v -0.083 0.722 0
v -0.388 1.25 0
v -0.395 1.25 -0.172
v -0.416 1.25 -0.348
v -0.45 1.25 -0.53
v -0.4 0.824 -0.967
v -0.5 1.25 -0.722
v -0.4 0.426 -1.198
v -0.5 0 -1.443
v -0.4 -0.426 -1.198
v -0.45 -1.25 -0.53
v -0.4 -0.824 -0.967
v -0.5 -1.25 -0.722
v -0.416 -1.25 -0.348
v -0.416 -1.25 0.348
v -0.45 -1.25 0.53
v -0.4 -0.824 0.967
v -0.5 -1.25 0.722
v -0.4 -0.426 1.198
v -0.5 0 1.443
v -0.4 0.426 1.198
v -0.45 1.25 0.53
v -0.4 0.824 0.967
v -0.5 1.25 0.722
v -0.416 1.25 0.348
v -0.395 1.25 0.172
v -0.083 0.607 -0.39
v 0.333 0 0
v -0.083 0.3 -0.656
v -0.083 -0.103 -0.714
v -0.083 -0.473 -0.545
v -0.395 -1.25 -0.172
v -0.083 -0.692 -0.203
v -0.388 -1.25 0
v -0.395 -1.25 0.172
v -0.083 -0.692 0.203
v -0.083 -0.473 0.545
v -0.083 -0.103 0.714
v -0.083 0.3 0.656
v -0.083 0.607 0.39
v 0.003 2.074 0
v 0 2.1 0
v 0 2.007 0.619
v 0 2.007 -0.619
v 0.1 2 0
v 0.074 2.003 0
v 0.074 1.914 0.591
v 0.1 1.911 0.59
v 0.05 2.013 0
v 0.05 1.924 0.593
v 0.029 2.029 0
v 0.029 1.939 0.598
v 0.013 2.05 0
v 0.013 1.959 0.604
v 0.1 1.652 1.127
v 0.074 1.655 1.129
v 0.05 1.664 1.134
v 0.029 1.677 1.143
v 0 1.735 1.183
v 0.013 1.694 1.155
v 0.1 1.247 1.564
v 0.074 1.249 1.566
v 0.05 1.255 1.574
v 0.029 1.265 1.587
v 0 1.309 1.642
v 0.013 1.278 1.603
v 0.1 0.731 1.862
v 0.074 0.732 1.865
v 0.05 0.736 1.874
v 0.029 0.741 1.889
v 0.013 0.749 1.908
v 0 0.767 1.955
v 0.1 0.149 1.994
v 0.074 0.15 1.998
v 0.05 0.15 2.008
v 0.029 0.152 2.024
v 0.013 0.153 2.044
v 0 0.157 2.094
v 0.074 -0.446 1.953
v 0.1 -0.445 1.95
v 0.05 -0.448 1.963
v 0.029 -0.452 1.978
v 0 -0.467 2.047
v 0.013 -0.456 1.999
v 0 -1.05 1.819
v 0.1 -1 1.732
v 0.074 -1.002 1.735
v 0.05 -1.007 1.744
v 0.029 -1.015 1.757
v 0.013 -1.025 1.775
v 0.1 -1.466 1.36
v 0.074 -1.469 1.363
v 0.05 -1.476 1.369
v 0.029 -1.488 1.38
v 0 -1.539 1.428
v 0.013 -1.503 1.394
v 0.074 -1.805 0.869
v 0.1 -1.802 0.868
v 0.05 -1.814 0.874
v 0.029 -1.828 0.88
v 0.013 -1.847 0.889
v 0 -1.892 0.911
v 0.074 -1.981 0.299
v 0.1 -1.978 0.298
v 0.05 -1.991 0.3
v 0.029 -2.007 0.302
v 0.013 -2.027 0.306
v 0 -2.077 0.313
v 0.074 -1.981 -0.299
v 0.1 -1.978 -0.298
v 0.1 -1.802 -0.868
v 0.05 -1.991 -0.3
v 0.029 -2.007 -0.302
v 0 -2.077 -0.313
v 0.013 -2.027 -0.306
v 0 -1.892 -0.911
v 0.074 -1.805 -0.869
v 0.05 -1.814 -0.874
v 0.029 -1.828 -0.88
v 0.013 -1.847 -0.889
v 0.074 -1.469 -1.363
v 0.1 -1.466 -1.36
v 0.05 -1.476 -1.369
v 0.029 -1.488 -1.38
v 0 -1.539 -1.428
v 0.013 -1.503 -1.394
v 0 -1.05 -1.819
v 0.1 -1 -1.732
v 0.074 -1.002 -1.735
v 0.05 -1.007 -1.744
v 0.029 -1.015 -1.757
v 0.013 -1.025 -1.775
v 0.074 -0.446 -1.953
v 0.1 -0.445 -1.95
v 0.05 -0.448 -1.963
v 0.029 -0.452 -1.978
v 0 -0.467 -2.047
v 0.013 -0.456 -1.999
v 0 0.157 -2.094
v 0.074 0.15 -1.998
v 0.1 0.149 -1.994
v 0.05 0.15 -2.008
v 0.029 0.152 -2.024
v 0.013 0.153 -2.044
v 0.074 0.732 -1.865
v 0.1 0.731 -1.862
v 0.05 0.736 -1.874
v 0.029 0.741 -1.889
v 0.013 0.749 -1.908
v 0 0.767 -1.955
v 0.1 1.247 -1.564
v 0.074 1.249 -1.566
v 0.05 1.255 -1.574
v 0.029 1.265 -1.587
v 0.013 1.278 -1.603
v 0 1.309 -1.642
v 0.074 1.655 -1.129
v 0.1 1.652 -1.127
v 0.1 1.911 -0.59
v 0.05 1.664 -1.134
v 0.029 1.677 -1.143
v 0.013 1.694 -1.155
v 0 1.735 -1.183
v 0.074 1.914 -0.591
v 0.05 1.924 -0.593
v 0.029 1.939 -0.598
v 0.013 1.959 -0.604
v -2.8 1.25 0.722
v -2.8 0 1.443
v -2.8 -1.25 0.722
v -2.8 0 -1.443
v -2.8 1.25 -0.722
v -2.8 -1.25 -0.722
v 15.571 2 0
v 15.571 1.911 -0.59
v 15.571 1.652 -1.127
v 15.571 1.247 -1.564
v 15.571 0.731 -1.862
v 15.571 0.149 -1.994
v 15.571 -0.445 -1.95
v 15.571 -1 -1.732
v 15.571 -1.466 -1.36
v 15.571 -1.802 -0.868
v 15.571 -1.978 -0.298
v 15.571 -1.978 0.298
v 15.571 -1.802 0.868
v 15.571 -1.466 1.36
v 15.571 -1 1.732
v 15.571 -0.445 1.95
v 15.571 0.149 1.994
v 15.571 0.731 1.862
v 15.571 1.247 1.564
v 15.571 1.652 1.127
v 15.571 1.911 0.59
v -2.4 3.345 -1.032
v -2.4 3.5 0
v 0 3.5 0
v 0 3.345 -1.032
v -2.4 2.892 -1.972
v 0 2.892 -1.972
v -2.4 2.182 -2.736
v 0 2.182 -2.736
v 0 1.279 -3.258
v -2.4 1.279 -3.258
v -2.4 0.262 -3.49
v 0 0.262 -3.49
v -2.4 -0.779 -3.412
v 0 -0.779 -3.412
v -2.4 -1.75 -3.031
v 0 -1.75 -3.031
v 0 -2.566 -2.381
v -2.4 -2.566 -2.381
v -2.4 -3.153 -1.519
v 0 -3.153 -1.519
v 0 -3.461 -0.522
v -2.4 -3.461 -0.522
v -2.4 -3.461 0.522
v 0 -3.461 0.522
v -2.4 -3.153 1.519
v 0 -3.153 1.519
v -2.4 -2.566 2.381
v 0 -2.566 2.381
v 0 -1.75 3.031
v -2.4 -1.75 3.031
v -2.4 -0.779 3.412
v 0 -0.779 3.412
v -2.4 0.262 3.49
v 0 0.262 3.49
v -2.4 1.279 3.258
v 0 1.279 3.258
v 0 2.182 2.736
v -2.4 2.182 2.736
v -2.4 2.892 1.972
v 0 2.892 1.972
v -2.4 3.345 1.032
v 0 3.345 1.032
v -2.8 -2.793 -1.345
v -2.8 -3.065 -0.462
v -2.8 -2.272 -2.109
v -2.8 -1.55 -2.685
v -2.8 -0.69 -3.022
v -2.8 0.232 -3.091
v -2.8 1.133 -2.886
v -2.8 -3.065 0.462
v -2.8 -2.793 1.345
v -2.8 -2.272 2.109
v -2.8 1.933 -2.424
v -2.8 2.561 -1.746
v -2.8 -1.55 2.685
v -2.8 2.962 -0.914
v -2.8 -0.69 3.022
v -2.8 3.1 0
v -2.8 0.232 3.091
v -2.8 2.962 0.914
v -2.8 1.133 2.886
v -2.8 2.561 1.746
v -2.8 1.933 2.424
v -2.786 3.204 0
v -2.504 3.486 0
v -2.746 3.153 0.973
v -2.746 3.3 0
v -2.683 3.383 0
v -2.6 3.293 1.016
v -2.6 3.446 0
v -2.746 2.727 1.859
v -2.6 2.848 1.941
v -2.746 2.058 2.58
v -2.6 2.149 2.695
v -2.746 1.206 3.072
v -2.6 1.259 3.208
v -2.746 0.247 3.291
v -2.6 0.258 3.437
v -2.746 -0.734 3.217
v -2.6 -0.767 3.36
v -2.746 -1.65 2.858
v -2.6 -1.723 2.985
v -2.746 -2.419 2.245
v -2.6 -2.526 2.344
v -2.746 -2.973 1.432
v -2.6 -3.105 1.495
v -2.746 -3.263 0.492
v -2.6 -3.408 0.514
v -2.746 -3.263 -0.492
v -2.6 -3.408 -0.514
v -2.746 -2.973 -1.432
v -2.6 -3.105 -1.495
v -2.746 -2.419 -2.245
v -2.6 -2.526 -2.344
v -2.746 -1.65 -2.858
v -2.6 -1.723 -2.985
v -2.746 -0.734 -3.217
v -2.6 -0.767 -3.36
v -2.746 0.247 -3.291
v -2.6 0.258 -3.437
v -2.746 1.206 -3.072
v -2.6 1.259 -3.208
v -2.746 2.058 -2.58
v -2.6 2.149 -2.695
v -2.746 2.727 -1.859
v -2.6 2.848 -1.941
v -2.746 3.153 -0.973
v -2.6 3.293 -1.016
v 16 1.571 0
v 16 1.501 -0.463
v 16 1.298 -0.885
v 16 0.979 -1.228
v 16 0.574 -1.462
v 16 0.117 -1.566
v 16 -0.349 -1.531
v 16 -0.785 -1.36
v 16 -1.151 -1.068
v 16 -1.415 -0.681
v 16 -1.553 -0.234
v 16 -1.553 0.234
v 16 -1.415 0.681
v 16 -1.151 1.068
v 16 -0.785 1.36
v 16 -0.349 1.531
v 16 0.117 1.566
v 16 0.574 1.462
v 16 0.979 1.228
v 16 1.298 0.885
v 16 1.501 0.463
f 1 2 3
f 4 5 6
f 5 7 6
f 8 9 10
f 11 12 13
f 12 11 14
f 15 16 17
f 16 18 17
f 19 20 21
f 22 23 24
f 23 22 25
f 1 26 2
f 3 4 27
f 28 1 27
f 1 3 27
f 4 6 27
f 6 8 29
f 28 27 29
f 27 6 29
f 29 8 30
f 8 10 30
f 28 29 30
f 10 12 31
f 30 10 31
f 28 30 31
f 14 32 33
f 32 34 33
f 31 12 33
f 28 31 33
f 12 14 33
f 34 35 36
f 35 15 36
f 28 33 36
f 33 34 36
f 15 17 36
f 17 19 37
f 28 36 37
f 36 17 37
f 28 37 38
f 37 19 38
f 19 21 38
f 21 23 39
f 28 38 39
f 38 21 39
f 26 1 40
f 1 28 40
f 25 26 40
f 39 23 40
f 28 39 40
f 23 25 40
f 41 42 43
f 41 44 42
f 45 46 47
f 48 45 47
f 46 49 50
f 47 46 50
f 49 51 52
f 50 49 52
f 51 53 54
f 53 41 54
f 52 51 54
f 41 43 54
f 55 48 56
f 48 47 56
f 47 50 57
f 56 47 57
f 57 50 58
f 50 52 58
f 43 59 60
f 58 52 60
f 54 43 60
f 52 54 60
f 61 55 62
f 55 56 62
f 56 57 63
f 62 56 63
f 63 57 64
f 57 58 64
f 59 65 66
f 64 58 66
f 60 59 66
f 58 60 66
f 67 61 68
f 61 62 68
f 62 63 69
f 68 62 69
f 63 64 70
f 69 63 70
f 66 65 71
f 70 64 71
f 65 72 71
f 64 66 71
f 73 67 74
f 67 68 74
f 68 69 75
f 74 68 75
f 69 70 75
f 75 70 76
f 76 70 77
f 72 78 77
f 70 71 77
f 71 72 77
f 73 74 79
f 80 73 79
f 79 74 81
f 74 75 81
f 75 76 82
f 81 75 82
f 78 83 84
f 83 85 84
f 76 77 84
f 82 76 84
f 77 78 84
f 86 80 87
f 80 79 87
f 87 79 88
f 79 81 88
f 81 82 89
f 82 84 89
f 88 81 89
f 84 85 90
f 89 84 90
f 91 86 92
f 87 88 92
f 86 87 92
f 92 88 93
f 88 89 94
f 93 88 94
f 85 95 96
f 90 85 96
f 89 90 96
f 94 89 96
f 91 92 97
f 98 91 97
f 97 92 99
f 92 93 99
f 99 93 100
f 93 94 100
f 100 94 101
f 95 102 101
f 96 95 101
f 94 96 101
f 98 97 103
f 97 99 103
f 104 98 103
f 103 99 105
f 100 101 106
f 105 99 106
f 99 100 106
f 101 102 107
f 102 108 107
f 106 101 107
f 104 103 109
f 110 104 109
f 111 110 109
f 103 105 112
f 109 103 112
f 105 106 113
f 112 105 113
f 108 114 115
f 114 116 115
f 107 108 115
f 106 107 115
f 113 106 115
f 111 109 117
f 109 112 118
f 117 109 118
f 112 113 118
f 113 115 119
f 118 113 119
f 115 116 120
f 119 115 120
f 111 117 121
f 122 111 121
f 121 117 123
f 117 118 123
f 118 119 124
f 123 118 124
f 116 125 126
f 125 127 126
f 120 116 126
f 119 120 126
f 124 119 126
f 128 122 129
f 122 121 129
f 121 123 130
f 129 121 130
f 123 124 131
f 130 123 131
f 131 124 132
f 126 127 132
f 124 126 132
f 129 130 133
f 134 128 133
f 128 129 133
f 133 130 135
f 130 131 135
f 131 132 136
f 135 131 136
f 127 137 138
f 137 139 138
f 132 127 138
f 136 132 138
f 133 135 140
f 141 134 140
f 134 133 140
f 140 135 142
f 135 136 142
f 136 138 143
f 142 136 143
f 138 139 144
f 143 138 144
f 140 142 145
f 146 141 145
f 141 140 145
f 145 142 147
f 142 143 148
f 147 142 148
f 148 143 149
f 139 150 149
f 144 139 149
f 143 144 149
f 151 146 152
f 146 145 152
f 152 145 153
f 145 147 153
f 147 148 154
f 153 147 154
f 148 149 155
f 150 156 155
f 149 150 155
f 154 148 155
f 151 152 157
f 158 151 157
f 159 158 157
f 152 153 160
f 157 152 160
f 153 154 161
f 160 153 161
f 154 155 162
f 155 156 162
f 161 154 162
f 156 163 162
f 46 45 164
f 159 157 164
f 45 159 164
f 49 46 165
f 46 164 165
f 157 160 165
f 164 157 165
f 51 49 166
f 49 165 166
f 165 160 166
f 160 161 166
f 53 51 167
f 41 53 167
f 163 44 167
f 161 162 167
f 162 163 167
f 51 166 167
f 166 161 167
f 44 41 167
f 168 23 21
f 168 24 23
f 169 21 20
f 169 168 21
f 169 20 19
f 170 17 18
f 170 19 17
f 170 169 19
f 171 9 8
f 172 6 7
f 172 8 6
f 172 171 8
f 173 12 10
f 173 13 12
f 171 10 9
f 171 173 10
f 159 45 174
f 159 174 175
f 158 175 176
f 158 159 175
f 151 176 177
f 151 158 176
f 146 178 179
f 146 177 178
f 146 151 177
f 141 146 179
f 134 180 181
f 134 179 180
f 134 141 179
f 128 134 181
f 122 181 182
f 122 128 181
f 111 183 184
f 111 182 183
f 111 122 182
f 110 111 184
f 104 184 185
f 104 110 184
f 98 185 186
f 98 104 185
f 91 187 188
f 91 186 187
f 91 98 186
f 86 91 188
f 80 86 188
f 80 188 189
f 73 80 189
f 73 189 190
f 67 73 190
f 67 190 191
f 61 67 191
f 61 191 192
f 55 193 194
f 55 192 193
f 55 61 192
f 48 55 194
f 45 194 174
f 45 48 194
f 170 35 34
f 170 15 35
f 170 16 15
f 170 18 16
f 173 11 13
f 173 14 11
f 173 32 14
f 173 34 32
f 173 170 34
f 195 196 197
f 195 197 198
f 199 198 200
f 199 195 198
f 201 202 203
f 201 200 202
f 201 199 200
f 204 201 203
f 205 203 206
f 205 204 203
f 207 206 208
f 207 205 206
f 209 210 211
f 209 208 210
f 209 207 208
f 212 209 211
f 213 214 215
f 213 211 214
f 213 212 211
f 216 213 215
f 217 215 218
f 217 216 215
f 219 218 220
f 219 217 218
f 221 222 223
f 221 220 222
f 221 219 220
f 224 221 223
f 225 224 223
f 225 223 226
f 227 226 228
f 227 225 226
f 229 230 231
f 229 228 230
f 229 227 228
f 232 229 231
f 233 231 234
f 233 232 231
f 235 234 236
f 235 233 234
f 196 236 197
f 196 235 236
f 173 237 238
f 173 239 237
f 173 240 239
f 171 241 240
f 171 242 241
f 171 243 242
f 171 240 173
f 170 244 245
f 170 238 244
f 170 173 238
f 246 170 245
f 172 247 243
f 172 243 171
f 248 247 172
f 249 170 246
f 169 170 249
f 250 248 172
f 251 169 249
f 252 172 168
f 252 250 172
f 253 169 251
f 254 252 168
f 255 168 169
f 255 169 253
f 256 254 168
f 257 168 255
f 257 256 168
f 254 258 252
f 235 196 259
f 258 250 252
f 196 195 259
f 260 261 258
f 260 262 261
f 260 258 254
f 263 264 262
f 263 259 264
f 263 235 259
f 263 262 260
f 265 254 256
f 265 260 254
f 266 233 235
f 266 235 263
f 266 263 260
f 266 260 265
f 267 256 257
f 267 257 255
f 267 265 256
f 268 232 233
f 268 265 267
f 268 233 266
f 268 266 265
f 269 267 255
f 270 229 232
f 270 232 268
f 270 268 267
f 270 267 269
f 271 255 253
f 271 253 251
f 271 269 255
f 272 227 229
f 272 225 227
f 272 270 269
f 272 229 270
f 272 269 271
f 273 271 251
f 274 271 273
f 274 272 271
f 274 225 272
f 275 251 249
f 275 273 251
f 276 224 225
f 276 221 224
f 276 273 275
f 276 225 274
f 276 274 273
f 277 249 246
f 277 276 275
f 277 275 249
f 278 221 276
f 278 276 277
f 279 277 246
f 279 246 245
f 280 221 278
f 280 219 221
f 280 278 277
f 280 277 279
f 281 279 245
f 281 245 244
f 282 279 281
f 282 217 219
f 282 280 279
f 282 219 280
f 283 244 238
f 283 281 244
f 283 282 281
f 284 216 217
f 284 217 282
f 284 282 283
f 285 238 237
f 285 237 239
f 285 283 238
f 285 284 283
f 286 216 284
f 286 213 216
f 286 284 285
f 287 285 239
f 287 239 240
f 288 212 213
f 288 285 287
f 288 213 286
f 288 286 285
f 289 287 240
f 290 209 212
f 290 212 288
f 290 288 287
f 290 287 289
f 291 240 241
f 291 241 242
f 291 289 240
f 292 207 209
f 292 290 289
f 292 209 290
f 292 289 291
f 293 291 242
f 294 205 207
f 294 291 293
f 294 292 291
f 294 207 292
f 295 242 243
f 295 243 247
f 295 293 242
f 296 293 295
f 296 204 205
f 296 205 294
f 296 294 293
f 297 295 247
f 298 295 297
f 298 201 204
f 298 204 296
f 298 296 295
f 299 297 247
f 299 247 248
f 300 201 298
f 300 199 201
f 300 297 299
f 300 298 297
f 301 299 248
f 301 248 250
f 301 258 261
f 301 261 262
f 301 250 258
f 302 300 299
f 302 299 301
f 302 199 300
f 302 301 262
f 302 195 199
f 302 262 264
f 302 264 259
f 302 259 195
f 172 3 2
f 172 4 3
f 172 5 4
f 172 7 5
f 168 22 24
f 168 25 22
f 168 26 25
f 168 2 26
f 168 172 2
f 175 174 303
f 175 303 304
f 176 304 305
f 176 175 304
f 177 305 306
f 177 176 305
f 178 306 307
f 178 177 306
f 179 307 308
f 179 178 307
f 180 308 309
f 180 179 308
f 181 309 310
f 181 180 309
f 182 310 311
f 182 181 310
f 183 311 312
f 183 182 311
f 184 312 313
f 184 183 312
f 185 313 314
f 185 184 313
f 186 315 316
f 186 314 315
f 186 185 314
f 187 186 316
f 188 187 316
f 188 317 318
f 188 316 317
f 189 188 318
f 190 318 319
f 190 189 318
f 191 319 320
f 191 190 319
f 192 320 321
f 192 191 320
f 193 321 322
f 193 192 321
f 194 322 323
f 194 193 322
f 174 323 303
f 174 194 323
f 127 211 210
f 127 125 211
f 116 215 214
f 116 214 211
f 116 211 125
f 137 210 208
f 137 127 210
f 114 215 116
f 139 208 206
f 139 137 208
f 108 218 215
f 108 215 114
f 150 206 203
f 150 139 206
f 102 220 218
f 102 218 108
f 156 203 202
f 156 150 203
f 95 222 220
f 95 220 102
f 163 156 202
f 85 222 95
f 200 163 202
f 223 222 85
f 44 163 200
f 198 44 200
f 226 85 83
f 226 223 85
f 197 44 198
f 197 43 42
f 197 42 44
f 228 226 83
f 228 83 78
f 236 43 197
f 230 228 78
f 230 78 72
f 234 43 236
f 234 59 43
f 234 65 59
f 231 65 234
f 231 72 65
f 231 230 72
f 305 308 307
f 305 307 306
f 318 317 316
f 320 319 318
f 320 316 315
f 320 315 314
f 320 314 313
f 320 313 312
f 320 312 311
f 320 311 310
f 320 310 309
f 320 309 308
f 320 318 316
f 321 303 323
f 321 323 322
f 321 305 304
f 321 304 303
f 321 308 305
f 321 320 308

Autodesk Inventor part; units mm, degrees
ref_plane "YZ Plane" through (0, 0, 0) normal (1, 0, 0) x (0, 1, 0)
ref_plane "XZ Plane" through (0, 0, 0) normal (0, 1, 0) x (-1, 0, 0)
sketch "Sketch1" plane through (0, 0, 0) normal (0, 0, 1) x (1, 0, 0)
  line L0 (0.3333, 0) -> (16, 0)
  line L1 (16, 0) -> (16, 2)
  line L2 (16, 2) -> (2.1, 2)
  line L3 (2.1, 2) -> (1.6705, 2)
  line L4 (1.6705, 2) -> (0, 2)
  line L5 (0, 2) -> (0, 3.5)
  line L6 (0, 3.5) -> (-2.8, 3.5)
  line L7 (-2.8, 3.5) -> (-2.8, 1.4434)
  line L8 (-2.8, 1.4434) -> (-0.5, 1.4434)
  line L9 (-0.5, 1.4434) -> (0.3333, 0)
  line L10 (-6.56, 0) -> (19.76, 0) projected
  line L11 (0, -0.7) -> (0, 4.2) projected
  line L12 (2.1, 2) -> (0, 2) construction
  dimension "d1" = 13.9
  dimension "d2" = 0.4295
  dimension "d3" = 2.8
  dimension "d4" = 2.3
  dimension "d5" = 60
  dimension "d6" = 4
  dimension "d7" = 4
  dimension "d8" = 2.8868
  dimension "d9" = 7
  dimension "d26" = 16
revolve "Body" add sketch "Sketch1" angle 360 about axis through (0.3333, 0, 0) along (1, 0, 0) contours L9 L11 L4 L3 L2 L1 L0 | L9 L8 L7 L6 L5 L11
sketch "Sketch2" plane through (-2.8, 0, 0) normal (-1, 0, 0) x (0, 0, 1)
  circle A0 centre (0, 0) radius 1.4434 projected
  line L0 (0, -4.9) -> (0, 4.9) projected
  line L1 (-4.9, 0) -> (4.9, 0) projected
  line L2 (1.4434, 0) -> (0.7217, -1.25)
  line L3 (0.7217, -1.25) -> (-0.7217, -1.25)
  line L4 (-0.7217, -1.25) -> (-1.4434, 0)
  line L5 (-1.4434, 0) -> (-0.7217, 1.25)
  line L6 (-0.7217, 1.25) -> (0.7217, 1.25)
  line L7 (0.7217, 1.25) -> (1.4434, 0)
extrude "Slot" add sketch "Sketch2" against normal up to next contours L7 A0 | A0 L2 | L6 L0 A0 | A0 L0 L3 | L0 L6 A0 | A0 L3 L0 | L4 A0 | A0 L5
fillet "Fillet1" radius 0.4 1 edges at (-2.8, -3.5, 0)
thread "Thread" size "M4x0.7" class "6g" standard "ISO Metric profile" length 13.9
chamfer "Chamfer1" distance 0.4294 distance2 0.4294 1 edges at (16, -2, 0) measured on face at (16, 0.527, -0.2661)
ref_plane "Work Plane1" through (29, 0, 0) normal (0, -1, 0) x (1, 0, 0)
fillet "Fillet2" radius 0.1 1 edges at (0, -2, 0)
equation "\"d1\" = GEL"
equation "\"d3\" = KOH"
equation "\"d4\" = INTI"
equation "\"d6\" = GD"
equation "\"d7\" = BDM"
equation "\"d8\" = 1.1547 * SW"
equation "\"d9\" = KOD"
equation "\"d26\" = NLG"
equation "\"d30\" = R"
equation "\"d17\" = RR"
equation "\"d13\" = GEL"
equation "\"d15\" = -0.5 * SPD + 0.5 * GD"
equation "\"d16\" = GUL"
equation "\"GD\" = NND"
equation "\"NLG\" = 16"
equation "\"GEL\" = 13.9"
equation "\"KOD\" = 7"
equation "\"KOH\" = 2.8"
equation "\"INTI\" = 2.3"
equation "\"GAL\" = 0.61345 * PTC"
equation "\"GUL\" = 0.61345 * PTC"
equation "\"BDM\" = NND"
equation "\"SW\" = 2.5"
equation "\"RR\" = 0.4"
equation "\"SPD\" = NND - 1.2269 * PTC"
equation "\"R\" = 0.1"
equation "\"TOA\" = 30deg"
equation "\"GD1\" = THREADDIA - 1.2269 * PTC"
equation "\"THREADDIA\" = 4"
equation "\"FAWI\" = 45deg"
equation "\"ANG\" = 120deg"
equation "\"PTC\" = 0.7"
equation "\"NND\" = 4"
equation "\"E0\" = 1.155 * SW"
properties part number "DIN 7984 - M4 x 16" material "Steel, Mild"
